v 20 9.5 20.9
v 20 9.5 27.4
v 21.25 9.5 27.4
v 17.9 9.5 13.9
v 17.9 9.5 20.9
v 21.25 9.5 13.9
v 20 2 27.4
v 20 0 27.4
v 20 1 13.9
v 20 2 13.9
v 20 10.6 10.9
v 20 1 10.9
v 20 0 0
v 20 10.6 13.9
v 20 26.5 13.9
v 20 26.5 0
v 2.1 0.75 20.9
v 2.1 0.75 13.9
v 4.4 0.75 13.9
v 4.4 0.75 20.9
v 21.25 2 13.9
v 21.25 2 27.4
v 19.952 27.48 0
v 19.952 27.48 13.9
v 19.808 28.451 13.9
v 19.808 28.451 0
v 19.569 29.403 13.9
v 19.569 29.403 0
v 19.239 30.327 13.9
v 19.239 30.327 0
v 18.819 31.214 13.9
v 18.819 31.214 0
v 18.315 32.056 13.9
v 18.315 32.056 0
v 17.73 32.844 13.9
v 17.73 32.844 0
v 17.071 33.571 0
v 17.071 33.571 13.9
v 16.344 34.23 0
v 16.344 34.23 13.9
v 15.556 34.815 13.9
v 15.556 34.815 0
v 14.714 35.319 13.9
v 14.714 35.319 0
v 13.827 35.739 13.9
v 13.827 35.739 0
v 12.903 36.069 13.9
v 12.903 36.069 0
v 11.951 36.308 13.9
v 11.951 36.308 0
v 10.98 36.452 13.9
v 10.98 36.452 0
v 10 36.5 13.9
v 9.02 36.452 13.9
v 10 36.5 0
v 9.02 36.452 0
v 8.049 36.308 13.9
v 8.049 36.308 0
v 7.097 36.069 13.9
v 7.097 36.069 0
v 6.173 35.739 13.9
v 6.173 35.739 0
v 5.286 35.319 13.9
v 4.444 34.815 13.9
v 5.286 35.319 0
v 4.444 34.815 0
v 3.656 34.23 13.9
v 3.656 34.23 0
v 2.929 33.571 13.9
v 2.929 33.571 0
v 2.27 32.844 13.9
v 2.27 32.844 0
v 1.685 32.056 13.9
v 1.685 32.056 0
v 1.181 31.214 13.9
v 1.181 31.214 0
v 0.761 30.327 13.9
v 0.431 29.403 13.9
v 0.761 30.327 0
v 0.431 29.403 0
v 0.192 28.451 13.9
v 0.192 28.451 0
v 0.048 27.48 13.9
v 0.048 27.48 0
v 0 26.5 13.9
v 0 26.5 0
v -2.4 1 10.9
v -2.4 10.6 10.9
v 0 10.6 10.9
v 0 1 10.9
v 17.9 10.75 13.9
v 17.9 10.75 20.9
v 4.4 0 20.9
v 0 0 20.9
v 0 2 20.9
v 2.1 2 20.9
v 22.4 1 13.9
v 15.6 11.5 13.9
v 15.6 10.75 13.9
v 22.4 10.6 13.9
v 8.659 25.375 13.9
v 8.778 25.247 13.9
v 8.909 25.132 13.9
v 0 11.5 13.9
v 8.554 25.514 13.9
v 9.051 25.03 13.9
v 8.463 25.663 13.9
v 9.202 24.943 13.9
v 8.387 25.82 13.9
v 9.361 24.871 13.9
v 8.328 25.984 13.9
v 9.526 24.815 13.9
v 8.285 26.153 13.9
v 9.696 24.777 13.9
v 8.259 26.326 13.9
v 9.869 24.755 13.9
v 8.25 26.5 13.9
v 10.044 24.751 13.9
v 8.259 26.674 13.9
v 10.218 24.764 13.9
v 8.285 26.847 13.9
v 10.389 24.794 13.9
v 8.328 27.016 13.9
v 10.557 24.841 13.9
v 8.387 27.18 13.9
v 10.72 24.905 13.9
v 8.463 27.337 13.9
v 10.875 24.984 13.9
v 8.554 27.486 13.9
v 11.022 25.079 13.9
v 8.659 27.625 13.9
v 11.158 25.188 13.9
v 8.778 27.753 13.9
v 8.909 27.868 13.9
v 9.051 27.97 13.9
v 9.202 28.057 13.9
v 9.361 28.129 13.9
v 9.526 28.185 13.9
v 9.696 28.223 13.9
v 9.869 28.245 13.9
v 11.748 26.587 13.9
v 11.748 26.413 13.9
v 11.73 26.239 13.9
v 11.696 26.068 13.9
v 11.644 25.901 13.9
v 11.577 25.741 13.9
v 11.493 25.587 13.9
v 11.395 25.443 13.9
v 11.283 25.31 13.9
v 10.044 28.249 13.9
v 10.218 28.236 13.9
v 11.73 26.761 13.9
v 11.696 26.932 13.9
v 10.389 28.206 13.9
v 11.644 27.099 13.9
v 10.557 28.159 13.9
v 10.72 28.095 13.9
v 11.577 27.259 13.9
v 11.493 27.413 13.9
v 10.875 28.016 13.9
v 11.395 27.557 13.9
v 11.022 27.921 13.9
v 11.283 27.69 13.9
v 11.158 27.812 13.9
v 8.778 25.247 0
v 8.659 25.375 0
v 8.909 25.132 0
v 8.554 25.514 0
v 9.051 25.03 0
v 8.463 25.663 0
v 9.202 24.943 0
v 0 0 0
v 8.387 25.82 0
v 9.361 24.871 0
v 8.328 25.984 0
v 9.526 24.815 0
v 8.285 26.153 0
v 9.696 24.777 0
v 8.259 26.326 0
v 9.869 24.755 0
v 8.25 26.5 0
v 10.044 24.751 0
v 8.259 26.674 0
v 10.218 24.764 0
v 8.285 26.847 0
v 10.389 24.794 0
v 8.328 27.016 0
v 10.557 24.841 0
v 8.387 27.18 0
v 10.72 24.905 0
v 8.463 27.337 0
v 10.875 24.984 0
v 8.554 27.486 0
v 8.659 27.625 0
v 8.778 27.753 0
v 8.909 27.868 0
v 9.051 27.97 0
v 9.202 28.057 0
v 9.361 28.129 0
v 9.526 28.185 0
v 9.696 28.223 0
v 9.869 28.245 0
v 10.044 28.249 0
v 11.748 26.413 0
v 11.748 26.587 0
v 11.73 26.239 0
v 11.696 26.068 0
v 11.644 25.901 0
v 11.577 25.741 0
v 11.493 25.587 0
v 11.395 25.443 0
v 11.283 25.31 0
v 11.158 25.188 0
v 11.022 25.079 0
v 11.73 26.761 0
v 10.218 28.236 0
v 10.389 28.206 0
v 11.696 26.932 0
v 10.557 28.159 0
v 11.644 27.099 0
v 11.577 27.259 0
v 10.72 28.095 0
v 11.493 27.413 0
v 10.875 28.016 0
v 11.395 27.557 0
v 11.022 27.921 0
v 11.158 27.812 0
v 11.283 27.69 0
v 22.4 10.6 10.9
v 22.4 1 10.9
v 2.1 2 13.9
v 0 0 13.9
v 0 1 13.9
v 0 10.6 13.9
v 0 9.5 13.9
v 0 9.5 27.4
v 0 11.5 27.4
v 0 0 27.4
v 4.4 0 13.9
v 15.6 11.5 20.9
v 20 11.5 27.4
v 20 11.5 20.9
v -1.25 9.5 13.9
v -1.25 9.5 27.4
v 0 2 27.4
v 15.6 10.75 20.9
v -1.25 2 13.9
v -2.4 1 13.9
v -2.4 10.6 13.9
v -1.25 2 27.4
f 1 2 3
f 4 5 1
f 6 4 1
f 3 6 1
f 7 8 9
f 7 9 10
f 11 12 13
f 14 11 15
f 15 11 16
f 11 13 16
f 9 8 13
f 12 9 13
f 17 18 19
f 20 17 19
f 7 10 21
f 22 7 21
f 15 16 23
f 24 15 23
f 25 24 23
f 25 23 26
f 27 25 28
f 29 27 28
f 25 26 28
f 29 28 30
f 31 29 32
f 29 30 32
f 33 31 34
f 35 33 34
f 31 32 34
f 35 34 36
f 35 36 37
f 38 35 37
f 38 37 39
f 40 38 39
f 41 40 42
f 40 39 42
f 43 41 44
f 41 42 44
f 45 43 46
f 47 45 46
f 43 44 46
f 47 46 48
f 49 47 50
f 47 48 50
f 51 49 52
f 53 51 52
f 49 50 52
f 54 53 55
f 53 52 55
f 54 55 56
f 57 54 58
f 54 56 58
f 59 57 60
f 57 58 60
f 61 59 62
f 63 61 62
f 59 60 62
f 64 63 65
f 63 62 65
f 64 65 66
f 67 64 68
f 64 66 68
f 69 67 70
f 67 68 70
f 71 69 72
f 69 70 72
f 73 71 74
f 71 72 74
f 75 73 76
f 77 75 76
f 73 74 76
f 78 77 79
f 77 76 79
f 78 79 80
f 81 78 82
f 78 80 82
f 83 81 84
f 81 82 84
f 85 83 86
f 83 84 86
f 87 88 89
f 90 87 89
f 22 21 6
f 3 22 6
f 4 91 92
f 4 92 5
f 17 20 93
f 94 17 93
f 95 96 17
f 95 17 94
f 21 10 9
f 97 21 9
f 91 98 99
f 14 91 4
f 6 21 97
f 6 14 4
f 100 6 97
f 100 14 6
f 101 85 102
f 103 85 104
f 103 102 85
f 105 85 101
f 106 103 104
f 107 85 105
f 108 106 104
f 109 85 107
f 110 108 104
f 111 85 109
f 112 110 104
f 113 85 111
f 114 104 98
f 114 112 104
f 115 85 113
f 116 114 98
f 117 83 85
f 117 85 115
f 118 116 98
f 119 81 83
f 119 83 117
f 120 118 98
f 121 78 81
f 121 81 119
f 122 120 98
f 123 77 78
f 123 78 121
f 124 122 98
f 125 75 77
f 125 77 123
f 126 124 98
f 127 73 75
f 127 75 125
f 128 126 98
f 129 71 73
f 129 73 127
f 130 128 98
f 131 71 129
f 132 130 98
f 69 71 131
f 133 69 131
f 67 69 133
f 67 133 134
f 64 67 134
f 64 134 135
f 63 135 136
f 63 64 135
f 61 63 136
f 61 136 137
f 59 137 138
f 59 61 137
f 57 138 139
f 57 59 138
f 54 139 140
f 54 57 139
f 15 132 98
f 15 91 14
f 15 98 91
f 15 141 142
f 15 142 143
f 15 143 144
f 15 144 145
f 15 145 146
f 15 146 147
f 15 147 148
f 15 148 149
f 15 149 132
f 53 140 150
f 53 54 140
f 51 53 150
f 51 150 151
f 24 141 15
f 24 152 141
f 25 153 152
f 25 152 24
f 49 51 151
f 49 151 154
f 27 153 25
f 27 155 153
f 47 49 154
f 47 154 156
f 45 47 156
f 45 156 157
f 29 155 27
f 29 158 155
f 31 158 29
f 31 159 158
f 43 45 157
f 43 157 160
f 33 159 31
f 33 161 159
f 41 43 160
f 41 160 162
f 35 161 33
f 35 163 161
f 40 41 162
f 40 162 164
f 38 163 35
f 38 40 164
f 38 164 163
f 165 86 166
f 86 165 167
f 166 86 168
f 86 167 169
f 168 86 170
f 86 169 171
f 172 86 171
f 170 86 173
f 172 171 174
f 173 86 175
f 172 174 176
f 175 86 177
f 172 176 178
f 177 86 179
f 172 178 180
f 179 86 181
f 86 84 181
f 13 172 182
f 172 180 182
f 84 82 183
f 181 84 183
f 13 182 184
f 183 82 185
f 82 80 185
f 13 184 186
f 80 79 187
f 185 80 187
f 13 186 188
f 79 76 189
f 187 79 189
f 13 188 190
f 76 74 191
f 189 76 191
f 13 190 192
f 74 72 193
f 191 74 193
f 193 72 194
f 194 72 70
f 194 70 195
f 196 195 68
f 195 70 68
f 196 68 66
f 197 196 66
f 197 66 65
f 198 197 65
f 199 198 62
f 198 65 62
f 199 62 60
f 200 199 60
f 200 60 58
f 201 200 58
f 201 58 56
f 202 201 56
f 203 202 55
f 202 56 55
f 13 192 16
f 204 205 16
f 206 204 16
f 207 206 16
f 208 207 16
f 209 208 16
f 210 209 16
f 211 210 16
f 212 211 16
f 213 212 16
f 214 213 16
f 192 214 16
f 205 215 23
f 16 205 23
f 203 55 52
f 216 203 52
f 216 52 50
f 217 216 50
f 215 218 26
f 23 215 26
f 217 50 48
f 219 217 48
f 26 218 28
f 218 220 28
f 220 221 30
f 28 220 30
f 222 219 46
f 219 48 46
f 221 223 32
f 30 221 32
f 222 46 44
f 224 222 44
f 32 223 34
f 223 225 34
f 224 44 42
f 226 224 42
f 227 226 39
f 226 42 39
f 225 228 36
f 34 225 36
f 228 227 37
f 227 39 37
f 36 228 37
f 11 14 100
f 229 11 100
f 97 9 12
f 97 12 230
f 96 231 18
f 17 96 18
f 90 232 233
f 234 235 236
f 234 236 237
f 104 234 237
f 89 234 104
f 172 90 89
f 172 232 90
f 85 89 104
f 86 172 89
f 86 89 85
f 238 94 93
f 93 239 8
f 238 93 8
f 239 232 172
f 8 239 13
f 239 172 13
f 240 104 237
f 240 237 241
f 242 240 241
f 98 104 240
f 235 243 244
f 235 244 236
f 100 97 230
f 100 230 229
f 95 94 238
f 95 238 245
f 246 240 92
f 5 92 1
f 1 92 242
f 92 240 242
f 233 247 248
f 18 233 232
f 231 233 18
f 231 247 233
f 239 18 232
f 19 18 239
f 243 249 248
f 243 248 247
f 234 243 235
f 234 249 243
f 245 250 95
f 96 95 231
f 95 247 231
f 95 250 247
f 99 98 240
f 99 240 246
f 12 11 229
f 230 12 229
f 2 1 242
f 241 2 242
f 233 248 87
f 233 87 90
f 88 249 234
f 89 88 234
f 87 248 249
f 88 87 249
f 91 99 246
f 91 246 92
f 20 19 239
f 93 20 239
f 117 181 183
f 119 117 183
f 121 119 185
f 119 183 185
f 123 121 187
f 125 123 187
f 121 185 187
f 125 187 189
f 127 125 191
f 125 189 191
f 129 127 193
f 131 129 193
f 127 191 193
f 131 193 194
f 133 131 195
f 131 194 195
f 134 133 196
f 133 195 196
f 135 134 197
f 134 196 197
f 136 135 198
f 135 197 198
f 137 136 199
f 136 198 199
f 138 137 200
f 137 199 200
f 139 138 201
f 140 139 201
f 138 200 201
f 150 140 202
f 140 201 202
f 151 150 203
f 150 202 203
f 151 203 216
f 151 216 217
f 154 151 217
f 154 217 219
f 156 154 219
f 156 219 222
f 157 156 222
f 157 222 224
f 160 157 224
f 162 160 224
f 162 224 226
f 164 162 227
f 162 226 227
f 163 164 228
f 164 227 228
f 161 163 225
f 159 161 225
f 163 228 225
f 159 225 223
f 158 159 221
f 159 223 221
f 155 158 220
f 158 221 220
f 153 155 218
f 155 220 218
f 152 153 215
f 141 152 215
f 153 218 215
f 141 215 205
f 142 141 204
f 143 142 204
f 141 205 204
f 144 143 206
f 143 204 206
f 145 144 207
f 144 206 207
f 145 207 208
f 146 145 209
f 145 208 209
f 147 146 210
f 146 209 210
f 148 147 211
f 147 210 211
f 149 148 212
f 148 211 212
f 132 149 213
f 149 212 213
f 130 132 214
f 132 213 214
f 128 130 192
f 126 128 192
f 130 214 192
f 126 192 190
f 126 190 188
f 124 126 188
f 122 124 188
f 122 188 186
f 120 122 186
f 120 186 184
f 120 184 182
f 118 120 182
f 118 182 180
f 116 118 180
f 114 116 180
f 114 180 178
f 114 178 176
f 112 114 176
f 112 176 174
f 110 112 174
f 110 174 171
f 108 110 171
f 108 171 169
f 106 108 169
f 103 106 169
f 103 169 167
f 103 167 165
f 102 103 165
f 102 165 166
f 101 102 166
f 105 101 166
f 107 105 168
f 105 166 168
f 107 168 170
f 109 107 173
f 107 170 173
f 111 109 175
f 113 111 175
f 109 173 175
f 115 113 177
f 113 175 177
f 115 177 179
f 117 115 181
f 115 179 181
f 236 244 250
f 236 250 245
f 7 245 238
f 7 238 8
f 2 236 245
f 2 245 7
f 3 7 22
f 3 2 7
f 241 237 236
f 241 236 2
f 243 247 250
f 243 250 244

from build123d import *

# Parameters (mm, degrees)
BOSS_EXTRUDE1_DEPTH = 13.9
SKETCH2_W           = 20
SKETCH2_H           = 11.5
BOSS_EXTRUDE2_DEPTH = 13.5
SKETCH4_W           = 24.8
SKETCH4_H           = 9.6
BOSS_EXTRUDE3_DEPTH = 3
BOSS_EXTRUDE4_START = -13.5
SKETCH5_W           = 22.5
SKETCH5_H           = 7.5
BOSS_EXTRUDE4_DEPTH = 13.5
CUT_EXTRUDE1_DEPTH  = 7
SKETCH7_R           = 1.75
CUT_EXTRUDE2_DEPTH  = 13.9


with BuildPart() as part:
    # Sketch1 → Boss-Extrude1 (new body)
    with BuildSketch(Plane.XY):
        with BuildLine():
            Line((0, 0), (20, 0))
            Line((20, 0), (20, 26.5))
            ThreePointArc((20, 26.5), (10, 36.5), (0, 26.5))
            Line((0, 26.5), (0, 0))
        make_face()
    extrude(amount=BOSS_EXTRUDE1_DEPTH)

    # Sketch2 → Boss-Extrude2 (add)
    with BuildSketch(Plane.XY.offset(13.9)):
        with Locations((10, 5.75)):
            Rectangle(SKETCH2_W, SKETCH2_H)
    extrude(amount=BOSS_EXTRUDE2_DEPTH)

    # Sketch4 → Boss-Extrude3 (add)
    with BuildSketch(Plane.XY.offset(13.9)):
        with Locations((10, 5.8)):
            Rectangle(SKETCH4_W, SKETCH4_H)
    extrude(amount=-BOSS_EXTRUDE3_DEPTH)

    # Sketch5 → Boss-Extrude4 (add)
    with BuildSketch(Plane.XY.offset(27.4).offset(BOSS_EXTRUDE4_START)):
        with Locations((10, 5.75)):
            Rectangle(SKETCH5_W, SKETCH5_H)
    extrude(amount=BOSS_EXTRUDE4_DEPTH)

    # Sketch6 → Cut-Extrude1 (cut)
    with BuildSketch(Plane.XY.offset(13.9)):
        Polygon((20, 11.5), (15.6, 11.5), (15.6, 10.75), (17.9, 10.75), (17.9, 9.5), (20, 9.5), align=None)
        Polygon((0, 0), (0, 2), (2.1, 2), (2.1, 0.75), (4.4, 0.75), (4.4, 0), align=None)
    extrude(amount=CUT_EXTRUDE1_DEPTH, mode=Mode.SUBTRACT)

    # Sketch7 → Cut-Extrude2 (cut)
    with BuildSketch(Plane(origin=(0, 0, 0), x_dir=(-1, 0, 0), z_dir=(0, 0, -1))):
        with Locations((-10, 26.5)):
            Circle(SKETCH7_R)
    extrude(amount=-CUT_EXTRUDE2_DEPTH, mode=Mode.SUBTRACT)


solid = part.part
